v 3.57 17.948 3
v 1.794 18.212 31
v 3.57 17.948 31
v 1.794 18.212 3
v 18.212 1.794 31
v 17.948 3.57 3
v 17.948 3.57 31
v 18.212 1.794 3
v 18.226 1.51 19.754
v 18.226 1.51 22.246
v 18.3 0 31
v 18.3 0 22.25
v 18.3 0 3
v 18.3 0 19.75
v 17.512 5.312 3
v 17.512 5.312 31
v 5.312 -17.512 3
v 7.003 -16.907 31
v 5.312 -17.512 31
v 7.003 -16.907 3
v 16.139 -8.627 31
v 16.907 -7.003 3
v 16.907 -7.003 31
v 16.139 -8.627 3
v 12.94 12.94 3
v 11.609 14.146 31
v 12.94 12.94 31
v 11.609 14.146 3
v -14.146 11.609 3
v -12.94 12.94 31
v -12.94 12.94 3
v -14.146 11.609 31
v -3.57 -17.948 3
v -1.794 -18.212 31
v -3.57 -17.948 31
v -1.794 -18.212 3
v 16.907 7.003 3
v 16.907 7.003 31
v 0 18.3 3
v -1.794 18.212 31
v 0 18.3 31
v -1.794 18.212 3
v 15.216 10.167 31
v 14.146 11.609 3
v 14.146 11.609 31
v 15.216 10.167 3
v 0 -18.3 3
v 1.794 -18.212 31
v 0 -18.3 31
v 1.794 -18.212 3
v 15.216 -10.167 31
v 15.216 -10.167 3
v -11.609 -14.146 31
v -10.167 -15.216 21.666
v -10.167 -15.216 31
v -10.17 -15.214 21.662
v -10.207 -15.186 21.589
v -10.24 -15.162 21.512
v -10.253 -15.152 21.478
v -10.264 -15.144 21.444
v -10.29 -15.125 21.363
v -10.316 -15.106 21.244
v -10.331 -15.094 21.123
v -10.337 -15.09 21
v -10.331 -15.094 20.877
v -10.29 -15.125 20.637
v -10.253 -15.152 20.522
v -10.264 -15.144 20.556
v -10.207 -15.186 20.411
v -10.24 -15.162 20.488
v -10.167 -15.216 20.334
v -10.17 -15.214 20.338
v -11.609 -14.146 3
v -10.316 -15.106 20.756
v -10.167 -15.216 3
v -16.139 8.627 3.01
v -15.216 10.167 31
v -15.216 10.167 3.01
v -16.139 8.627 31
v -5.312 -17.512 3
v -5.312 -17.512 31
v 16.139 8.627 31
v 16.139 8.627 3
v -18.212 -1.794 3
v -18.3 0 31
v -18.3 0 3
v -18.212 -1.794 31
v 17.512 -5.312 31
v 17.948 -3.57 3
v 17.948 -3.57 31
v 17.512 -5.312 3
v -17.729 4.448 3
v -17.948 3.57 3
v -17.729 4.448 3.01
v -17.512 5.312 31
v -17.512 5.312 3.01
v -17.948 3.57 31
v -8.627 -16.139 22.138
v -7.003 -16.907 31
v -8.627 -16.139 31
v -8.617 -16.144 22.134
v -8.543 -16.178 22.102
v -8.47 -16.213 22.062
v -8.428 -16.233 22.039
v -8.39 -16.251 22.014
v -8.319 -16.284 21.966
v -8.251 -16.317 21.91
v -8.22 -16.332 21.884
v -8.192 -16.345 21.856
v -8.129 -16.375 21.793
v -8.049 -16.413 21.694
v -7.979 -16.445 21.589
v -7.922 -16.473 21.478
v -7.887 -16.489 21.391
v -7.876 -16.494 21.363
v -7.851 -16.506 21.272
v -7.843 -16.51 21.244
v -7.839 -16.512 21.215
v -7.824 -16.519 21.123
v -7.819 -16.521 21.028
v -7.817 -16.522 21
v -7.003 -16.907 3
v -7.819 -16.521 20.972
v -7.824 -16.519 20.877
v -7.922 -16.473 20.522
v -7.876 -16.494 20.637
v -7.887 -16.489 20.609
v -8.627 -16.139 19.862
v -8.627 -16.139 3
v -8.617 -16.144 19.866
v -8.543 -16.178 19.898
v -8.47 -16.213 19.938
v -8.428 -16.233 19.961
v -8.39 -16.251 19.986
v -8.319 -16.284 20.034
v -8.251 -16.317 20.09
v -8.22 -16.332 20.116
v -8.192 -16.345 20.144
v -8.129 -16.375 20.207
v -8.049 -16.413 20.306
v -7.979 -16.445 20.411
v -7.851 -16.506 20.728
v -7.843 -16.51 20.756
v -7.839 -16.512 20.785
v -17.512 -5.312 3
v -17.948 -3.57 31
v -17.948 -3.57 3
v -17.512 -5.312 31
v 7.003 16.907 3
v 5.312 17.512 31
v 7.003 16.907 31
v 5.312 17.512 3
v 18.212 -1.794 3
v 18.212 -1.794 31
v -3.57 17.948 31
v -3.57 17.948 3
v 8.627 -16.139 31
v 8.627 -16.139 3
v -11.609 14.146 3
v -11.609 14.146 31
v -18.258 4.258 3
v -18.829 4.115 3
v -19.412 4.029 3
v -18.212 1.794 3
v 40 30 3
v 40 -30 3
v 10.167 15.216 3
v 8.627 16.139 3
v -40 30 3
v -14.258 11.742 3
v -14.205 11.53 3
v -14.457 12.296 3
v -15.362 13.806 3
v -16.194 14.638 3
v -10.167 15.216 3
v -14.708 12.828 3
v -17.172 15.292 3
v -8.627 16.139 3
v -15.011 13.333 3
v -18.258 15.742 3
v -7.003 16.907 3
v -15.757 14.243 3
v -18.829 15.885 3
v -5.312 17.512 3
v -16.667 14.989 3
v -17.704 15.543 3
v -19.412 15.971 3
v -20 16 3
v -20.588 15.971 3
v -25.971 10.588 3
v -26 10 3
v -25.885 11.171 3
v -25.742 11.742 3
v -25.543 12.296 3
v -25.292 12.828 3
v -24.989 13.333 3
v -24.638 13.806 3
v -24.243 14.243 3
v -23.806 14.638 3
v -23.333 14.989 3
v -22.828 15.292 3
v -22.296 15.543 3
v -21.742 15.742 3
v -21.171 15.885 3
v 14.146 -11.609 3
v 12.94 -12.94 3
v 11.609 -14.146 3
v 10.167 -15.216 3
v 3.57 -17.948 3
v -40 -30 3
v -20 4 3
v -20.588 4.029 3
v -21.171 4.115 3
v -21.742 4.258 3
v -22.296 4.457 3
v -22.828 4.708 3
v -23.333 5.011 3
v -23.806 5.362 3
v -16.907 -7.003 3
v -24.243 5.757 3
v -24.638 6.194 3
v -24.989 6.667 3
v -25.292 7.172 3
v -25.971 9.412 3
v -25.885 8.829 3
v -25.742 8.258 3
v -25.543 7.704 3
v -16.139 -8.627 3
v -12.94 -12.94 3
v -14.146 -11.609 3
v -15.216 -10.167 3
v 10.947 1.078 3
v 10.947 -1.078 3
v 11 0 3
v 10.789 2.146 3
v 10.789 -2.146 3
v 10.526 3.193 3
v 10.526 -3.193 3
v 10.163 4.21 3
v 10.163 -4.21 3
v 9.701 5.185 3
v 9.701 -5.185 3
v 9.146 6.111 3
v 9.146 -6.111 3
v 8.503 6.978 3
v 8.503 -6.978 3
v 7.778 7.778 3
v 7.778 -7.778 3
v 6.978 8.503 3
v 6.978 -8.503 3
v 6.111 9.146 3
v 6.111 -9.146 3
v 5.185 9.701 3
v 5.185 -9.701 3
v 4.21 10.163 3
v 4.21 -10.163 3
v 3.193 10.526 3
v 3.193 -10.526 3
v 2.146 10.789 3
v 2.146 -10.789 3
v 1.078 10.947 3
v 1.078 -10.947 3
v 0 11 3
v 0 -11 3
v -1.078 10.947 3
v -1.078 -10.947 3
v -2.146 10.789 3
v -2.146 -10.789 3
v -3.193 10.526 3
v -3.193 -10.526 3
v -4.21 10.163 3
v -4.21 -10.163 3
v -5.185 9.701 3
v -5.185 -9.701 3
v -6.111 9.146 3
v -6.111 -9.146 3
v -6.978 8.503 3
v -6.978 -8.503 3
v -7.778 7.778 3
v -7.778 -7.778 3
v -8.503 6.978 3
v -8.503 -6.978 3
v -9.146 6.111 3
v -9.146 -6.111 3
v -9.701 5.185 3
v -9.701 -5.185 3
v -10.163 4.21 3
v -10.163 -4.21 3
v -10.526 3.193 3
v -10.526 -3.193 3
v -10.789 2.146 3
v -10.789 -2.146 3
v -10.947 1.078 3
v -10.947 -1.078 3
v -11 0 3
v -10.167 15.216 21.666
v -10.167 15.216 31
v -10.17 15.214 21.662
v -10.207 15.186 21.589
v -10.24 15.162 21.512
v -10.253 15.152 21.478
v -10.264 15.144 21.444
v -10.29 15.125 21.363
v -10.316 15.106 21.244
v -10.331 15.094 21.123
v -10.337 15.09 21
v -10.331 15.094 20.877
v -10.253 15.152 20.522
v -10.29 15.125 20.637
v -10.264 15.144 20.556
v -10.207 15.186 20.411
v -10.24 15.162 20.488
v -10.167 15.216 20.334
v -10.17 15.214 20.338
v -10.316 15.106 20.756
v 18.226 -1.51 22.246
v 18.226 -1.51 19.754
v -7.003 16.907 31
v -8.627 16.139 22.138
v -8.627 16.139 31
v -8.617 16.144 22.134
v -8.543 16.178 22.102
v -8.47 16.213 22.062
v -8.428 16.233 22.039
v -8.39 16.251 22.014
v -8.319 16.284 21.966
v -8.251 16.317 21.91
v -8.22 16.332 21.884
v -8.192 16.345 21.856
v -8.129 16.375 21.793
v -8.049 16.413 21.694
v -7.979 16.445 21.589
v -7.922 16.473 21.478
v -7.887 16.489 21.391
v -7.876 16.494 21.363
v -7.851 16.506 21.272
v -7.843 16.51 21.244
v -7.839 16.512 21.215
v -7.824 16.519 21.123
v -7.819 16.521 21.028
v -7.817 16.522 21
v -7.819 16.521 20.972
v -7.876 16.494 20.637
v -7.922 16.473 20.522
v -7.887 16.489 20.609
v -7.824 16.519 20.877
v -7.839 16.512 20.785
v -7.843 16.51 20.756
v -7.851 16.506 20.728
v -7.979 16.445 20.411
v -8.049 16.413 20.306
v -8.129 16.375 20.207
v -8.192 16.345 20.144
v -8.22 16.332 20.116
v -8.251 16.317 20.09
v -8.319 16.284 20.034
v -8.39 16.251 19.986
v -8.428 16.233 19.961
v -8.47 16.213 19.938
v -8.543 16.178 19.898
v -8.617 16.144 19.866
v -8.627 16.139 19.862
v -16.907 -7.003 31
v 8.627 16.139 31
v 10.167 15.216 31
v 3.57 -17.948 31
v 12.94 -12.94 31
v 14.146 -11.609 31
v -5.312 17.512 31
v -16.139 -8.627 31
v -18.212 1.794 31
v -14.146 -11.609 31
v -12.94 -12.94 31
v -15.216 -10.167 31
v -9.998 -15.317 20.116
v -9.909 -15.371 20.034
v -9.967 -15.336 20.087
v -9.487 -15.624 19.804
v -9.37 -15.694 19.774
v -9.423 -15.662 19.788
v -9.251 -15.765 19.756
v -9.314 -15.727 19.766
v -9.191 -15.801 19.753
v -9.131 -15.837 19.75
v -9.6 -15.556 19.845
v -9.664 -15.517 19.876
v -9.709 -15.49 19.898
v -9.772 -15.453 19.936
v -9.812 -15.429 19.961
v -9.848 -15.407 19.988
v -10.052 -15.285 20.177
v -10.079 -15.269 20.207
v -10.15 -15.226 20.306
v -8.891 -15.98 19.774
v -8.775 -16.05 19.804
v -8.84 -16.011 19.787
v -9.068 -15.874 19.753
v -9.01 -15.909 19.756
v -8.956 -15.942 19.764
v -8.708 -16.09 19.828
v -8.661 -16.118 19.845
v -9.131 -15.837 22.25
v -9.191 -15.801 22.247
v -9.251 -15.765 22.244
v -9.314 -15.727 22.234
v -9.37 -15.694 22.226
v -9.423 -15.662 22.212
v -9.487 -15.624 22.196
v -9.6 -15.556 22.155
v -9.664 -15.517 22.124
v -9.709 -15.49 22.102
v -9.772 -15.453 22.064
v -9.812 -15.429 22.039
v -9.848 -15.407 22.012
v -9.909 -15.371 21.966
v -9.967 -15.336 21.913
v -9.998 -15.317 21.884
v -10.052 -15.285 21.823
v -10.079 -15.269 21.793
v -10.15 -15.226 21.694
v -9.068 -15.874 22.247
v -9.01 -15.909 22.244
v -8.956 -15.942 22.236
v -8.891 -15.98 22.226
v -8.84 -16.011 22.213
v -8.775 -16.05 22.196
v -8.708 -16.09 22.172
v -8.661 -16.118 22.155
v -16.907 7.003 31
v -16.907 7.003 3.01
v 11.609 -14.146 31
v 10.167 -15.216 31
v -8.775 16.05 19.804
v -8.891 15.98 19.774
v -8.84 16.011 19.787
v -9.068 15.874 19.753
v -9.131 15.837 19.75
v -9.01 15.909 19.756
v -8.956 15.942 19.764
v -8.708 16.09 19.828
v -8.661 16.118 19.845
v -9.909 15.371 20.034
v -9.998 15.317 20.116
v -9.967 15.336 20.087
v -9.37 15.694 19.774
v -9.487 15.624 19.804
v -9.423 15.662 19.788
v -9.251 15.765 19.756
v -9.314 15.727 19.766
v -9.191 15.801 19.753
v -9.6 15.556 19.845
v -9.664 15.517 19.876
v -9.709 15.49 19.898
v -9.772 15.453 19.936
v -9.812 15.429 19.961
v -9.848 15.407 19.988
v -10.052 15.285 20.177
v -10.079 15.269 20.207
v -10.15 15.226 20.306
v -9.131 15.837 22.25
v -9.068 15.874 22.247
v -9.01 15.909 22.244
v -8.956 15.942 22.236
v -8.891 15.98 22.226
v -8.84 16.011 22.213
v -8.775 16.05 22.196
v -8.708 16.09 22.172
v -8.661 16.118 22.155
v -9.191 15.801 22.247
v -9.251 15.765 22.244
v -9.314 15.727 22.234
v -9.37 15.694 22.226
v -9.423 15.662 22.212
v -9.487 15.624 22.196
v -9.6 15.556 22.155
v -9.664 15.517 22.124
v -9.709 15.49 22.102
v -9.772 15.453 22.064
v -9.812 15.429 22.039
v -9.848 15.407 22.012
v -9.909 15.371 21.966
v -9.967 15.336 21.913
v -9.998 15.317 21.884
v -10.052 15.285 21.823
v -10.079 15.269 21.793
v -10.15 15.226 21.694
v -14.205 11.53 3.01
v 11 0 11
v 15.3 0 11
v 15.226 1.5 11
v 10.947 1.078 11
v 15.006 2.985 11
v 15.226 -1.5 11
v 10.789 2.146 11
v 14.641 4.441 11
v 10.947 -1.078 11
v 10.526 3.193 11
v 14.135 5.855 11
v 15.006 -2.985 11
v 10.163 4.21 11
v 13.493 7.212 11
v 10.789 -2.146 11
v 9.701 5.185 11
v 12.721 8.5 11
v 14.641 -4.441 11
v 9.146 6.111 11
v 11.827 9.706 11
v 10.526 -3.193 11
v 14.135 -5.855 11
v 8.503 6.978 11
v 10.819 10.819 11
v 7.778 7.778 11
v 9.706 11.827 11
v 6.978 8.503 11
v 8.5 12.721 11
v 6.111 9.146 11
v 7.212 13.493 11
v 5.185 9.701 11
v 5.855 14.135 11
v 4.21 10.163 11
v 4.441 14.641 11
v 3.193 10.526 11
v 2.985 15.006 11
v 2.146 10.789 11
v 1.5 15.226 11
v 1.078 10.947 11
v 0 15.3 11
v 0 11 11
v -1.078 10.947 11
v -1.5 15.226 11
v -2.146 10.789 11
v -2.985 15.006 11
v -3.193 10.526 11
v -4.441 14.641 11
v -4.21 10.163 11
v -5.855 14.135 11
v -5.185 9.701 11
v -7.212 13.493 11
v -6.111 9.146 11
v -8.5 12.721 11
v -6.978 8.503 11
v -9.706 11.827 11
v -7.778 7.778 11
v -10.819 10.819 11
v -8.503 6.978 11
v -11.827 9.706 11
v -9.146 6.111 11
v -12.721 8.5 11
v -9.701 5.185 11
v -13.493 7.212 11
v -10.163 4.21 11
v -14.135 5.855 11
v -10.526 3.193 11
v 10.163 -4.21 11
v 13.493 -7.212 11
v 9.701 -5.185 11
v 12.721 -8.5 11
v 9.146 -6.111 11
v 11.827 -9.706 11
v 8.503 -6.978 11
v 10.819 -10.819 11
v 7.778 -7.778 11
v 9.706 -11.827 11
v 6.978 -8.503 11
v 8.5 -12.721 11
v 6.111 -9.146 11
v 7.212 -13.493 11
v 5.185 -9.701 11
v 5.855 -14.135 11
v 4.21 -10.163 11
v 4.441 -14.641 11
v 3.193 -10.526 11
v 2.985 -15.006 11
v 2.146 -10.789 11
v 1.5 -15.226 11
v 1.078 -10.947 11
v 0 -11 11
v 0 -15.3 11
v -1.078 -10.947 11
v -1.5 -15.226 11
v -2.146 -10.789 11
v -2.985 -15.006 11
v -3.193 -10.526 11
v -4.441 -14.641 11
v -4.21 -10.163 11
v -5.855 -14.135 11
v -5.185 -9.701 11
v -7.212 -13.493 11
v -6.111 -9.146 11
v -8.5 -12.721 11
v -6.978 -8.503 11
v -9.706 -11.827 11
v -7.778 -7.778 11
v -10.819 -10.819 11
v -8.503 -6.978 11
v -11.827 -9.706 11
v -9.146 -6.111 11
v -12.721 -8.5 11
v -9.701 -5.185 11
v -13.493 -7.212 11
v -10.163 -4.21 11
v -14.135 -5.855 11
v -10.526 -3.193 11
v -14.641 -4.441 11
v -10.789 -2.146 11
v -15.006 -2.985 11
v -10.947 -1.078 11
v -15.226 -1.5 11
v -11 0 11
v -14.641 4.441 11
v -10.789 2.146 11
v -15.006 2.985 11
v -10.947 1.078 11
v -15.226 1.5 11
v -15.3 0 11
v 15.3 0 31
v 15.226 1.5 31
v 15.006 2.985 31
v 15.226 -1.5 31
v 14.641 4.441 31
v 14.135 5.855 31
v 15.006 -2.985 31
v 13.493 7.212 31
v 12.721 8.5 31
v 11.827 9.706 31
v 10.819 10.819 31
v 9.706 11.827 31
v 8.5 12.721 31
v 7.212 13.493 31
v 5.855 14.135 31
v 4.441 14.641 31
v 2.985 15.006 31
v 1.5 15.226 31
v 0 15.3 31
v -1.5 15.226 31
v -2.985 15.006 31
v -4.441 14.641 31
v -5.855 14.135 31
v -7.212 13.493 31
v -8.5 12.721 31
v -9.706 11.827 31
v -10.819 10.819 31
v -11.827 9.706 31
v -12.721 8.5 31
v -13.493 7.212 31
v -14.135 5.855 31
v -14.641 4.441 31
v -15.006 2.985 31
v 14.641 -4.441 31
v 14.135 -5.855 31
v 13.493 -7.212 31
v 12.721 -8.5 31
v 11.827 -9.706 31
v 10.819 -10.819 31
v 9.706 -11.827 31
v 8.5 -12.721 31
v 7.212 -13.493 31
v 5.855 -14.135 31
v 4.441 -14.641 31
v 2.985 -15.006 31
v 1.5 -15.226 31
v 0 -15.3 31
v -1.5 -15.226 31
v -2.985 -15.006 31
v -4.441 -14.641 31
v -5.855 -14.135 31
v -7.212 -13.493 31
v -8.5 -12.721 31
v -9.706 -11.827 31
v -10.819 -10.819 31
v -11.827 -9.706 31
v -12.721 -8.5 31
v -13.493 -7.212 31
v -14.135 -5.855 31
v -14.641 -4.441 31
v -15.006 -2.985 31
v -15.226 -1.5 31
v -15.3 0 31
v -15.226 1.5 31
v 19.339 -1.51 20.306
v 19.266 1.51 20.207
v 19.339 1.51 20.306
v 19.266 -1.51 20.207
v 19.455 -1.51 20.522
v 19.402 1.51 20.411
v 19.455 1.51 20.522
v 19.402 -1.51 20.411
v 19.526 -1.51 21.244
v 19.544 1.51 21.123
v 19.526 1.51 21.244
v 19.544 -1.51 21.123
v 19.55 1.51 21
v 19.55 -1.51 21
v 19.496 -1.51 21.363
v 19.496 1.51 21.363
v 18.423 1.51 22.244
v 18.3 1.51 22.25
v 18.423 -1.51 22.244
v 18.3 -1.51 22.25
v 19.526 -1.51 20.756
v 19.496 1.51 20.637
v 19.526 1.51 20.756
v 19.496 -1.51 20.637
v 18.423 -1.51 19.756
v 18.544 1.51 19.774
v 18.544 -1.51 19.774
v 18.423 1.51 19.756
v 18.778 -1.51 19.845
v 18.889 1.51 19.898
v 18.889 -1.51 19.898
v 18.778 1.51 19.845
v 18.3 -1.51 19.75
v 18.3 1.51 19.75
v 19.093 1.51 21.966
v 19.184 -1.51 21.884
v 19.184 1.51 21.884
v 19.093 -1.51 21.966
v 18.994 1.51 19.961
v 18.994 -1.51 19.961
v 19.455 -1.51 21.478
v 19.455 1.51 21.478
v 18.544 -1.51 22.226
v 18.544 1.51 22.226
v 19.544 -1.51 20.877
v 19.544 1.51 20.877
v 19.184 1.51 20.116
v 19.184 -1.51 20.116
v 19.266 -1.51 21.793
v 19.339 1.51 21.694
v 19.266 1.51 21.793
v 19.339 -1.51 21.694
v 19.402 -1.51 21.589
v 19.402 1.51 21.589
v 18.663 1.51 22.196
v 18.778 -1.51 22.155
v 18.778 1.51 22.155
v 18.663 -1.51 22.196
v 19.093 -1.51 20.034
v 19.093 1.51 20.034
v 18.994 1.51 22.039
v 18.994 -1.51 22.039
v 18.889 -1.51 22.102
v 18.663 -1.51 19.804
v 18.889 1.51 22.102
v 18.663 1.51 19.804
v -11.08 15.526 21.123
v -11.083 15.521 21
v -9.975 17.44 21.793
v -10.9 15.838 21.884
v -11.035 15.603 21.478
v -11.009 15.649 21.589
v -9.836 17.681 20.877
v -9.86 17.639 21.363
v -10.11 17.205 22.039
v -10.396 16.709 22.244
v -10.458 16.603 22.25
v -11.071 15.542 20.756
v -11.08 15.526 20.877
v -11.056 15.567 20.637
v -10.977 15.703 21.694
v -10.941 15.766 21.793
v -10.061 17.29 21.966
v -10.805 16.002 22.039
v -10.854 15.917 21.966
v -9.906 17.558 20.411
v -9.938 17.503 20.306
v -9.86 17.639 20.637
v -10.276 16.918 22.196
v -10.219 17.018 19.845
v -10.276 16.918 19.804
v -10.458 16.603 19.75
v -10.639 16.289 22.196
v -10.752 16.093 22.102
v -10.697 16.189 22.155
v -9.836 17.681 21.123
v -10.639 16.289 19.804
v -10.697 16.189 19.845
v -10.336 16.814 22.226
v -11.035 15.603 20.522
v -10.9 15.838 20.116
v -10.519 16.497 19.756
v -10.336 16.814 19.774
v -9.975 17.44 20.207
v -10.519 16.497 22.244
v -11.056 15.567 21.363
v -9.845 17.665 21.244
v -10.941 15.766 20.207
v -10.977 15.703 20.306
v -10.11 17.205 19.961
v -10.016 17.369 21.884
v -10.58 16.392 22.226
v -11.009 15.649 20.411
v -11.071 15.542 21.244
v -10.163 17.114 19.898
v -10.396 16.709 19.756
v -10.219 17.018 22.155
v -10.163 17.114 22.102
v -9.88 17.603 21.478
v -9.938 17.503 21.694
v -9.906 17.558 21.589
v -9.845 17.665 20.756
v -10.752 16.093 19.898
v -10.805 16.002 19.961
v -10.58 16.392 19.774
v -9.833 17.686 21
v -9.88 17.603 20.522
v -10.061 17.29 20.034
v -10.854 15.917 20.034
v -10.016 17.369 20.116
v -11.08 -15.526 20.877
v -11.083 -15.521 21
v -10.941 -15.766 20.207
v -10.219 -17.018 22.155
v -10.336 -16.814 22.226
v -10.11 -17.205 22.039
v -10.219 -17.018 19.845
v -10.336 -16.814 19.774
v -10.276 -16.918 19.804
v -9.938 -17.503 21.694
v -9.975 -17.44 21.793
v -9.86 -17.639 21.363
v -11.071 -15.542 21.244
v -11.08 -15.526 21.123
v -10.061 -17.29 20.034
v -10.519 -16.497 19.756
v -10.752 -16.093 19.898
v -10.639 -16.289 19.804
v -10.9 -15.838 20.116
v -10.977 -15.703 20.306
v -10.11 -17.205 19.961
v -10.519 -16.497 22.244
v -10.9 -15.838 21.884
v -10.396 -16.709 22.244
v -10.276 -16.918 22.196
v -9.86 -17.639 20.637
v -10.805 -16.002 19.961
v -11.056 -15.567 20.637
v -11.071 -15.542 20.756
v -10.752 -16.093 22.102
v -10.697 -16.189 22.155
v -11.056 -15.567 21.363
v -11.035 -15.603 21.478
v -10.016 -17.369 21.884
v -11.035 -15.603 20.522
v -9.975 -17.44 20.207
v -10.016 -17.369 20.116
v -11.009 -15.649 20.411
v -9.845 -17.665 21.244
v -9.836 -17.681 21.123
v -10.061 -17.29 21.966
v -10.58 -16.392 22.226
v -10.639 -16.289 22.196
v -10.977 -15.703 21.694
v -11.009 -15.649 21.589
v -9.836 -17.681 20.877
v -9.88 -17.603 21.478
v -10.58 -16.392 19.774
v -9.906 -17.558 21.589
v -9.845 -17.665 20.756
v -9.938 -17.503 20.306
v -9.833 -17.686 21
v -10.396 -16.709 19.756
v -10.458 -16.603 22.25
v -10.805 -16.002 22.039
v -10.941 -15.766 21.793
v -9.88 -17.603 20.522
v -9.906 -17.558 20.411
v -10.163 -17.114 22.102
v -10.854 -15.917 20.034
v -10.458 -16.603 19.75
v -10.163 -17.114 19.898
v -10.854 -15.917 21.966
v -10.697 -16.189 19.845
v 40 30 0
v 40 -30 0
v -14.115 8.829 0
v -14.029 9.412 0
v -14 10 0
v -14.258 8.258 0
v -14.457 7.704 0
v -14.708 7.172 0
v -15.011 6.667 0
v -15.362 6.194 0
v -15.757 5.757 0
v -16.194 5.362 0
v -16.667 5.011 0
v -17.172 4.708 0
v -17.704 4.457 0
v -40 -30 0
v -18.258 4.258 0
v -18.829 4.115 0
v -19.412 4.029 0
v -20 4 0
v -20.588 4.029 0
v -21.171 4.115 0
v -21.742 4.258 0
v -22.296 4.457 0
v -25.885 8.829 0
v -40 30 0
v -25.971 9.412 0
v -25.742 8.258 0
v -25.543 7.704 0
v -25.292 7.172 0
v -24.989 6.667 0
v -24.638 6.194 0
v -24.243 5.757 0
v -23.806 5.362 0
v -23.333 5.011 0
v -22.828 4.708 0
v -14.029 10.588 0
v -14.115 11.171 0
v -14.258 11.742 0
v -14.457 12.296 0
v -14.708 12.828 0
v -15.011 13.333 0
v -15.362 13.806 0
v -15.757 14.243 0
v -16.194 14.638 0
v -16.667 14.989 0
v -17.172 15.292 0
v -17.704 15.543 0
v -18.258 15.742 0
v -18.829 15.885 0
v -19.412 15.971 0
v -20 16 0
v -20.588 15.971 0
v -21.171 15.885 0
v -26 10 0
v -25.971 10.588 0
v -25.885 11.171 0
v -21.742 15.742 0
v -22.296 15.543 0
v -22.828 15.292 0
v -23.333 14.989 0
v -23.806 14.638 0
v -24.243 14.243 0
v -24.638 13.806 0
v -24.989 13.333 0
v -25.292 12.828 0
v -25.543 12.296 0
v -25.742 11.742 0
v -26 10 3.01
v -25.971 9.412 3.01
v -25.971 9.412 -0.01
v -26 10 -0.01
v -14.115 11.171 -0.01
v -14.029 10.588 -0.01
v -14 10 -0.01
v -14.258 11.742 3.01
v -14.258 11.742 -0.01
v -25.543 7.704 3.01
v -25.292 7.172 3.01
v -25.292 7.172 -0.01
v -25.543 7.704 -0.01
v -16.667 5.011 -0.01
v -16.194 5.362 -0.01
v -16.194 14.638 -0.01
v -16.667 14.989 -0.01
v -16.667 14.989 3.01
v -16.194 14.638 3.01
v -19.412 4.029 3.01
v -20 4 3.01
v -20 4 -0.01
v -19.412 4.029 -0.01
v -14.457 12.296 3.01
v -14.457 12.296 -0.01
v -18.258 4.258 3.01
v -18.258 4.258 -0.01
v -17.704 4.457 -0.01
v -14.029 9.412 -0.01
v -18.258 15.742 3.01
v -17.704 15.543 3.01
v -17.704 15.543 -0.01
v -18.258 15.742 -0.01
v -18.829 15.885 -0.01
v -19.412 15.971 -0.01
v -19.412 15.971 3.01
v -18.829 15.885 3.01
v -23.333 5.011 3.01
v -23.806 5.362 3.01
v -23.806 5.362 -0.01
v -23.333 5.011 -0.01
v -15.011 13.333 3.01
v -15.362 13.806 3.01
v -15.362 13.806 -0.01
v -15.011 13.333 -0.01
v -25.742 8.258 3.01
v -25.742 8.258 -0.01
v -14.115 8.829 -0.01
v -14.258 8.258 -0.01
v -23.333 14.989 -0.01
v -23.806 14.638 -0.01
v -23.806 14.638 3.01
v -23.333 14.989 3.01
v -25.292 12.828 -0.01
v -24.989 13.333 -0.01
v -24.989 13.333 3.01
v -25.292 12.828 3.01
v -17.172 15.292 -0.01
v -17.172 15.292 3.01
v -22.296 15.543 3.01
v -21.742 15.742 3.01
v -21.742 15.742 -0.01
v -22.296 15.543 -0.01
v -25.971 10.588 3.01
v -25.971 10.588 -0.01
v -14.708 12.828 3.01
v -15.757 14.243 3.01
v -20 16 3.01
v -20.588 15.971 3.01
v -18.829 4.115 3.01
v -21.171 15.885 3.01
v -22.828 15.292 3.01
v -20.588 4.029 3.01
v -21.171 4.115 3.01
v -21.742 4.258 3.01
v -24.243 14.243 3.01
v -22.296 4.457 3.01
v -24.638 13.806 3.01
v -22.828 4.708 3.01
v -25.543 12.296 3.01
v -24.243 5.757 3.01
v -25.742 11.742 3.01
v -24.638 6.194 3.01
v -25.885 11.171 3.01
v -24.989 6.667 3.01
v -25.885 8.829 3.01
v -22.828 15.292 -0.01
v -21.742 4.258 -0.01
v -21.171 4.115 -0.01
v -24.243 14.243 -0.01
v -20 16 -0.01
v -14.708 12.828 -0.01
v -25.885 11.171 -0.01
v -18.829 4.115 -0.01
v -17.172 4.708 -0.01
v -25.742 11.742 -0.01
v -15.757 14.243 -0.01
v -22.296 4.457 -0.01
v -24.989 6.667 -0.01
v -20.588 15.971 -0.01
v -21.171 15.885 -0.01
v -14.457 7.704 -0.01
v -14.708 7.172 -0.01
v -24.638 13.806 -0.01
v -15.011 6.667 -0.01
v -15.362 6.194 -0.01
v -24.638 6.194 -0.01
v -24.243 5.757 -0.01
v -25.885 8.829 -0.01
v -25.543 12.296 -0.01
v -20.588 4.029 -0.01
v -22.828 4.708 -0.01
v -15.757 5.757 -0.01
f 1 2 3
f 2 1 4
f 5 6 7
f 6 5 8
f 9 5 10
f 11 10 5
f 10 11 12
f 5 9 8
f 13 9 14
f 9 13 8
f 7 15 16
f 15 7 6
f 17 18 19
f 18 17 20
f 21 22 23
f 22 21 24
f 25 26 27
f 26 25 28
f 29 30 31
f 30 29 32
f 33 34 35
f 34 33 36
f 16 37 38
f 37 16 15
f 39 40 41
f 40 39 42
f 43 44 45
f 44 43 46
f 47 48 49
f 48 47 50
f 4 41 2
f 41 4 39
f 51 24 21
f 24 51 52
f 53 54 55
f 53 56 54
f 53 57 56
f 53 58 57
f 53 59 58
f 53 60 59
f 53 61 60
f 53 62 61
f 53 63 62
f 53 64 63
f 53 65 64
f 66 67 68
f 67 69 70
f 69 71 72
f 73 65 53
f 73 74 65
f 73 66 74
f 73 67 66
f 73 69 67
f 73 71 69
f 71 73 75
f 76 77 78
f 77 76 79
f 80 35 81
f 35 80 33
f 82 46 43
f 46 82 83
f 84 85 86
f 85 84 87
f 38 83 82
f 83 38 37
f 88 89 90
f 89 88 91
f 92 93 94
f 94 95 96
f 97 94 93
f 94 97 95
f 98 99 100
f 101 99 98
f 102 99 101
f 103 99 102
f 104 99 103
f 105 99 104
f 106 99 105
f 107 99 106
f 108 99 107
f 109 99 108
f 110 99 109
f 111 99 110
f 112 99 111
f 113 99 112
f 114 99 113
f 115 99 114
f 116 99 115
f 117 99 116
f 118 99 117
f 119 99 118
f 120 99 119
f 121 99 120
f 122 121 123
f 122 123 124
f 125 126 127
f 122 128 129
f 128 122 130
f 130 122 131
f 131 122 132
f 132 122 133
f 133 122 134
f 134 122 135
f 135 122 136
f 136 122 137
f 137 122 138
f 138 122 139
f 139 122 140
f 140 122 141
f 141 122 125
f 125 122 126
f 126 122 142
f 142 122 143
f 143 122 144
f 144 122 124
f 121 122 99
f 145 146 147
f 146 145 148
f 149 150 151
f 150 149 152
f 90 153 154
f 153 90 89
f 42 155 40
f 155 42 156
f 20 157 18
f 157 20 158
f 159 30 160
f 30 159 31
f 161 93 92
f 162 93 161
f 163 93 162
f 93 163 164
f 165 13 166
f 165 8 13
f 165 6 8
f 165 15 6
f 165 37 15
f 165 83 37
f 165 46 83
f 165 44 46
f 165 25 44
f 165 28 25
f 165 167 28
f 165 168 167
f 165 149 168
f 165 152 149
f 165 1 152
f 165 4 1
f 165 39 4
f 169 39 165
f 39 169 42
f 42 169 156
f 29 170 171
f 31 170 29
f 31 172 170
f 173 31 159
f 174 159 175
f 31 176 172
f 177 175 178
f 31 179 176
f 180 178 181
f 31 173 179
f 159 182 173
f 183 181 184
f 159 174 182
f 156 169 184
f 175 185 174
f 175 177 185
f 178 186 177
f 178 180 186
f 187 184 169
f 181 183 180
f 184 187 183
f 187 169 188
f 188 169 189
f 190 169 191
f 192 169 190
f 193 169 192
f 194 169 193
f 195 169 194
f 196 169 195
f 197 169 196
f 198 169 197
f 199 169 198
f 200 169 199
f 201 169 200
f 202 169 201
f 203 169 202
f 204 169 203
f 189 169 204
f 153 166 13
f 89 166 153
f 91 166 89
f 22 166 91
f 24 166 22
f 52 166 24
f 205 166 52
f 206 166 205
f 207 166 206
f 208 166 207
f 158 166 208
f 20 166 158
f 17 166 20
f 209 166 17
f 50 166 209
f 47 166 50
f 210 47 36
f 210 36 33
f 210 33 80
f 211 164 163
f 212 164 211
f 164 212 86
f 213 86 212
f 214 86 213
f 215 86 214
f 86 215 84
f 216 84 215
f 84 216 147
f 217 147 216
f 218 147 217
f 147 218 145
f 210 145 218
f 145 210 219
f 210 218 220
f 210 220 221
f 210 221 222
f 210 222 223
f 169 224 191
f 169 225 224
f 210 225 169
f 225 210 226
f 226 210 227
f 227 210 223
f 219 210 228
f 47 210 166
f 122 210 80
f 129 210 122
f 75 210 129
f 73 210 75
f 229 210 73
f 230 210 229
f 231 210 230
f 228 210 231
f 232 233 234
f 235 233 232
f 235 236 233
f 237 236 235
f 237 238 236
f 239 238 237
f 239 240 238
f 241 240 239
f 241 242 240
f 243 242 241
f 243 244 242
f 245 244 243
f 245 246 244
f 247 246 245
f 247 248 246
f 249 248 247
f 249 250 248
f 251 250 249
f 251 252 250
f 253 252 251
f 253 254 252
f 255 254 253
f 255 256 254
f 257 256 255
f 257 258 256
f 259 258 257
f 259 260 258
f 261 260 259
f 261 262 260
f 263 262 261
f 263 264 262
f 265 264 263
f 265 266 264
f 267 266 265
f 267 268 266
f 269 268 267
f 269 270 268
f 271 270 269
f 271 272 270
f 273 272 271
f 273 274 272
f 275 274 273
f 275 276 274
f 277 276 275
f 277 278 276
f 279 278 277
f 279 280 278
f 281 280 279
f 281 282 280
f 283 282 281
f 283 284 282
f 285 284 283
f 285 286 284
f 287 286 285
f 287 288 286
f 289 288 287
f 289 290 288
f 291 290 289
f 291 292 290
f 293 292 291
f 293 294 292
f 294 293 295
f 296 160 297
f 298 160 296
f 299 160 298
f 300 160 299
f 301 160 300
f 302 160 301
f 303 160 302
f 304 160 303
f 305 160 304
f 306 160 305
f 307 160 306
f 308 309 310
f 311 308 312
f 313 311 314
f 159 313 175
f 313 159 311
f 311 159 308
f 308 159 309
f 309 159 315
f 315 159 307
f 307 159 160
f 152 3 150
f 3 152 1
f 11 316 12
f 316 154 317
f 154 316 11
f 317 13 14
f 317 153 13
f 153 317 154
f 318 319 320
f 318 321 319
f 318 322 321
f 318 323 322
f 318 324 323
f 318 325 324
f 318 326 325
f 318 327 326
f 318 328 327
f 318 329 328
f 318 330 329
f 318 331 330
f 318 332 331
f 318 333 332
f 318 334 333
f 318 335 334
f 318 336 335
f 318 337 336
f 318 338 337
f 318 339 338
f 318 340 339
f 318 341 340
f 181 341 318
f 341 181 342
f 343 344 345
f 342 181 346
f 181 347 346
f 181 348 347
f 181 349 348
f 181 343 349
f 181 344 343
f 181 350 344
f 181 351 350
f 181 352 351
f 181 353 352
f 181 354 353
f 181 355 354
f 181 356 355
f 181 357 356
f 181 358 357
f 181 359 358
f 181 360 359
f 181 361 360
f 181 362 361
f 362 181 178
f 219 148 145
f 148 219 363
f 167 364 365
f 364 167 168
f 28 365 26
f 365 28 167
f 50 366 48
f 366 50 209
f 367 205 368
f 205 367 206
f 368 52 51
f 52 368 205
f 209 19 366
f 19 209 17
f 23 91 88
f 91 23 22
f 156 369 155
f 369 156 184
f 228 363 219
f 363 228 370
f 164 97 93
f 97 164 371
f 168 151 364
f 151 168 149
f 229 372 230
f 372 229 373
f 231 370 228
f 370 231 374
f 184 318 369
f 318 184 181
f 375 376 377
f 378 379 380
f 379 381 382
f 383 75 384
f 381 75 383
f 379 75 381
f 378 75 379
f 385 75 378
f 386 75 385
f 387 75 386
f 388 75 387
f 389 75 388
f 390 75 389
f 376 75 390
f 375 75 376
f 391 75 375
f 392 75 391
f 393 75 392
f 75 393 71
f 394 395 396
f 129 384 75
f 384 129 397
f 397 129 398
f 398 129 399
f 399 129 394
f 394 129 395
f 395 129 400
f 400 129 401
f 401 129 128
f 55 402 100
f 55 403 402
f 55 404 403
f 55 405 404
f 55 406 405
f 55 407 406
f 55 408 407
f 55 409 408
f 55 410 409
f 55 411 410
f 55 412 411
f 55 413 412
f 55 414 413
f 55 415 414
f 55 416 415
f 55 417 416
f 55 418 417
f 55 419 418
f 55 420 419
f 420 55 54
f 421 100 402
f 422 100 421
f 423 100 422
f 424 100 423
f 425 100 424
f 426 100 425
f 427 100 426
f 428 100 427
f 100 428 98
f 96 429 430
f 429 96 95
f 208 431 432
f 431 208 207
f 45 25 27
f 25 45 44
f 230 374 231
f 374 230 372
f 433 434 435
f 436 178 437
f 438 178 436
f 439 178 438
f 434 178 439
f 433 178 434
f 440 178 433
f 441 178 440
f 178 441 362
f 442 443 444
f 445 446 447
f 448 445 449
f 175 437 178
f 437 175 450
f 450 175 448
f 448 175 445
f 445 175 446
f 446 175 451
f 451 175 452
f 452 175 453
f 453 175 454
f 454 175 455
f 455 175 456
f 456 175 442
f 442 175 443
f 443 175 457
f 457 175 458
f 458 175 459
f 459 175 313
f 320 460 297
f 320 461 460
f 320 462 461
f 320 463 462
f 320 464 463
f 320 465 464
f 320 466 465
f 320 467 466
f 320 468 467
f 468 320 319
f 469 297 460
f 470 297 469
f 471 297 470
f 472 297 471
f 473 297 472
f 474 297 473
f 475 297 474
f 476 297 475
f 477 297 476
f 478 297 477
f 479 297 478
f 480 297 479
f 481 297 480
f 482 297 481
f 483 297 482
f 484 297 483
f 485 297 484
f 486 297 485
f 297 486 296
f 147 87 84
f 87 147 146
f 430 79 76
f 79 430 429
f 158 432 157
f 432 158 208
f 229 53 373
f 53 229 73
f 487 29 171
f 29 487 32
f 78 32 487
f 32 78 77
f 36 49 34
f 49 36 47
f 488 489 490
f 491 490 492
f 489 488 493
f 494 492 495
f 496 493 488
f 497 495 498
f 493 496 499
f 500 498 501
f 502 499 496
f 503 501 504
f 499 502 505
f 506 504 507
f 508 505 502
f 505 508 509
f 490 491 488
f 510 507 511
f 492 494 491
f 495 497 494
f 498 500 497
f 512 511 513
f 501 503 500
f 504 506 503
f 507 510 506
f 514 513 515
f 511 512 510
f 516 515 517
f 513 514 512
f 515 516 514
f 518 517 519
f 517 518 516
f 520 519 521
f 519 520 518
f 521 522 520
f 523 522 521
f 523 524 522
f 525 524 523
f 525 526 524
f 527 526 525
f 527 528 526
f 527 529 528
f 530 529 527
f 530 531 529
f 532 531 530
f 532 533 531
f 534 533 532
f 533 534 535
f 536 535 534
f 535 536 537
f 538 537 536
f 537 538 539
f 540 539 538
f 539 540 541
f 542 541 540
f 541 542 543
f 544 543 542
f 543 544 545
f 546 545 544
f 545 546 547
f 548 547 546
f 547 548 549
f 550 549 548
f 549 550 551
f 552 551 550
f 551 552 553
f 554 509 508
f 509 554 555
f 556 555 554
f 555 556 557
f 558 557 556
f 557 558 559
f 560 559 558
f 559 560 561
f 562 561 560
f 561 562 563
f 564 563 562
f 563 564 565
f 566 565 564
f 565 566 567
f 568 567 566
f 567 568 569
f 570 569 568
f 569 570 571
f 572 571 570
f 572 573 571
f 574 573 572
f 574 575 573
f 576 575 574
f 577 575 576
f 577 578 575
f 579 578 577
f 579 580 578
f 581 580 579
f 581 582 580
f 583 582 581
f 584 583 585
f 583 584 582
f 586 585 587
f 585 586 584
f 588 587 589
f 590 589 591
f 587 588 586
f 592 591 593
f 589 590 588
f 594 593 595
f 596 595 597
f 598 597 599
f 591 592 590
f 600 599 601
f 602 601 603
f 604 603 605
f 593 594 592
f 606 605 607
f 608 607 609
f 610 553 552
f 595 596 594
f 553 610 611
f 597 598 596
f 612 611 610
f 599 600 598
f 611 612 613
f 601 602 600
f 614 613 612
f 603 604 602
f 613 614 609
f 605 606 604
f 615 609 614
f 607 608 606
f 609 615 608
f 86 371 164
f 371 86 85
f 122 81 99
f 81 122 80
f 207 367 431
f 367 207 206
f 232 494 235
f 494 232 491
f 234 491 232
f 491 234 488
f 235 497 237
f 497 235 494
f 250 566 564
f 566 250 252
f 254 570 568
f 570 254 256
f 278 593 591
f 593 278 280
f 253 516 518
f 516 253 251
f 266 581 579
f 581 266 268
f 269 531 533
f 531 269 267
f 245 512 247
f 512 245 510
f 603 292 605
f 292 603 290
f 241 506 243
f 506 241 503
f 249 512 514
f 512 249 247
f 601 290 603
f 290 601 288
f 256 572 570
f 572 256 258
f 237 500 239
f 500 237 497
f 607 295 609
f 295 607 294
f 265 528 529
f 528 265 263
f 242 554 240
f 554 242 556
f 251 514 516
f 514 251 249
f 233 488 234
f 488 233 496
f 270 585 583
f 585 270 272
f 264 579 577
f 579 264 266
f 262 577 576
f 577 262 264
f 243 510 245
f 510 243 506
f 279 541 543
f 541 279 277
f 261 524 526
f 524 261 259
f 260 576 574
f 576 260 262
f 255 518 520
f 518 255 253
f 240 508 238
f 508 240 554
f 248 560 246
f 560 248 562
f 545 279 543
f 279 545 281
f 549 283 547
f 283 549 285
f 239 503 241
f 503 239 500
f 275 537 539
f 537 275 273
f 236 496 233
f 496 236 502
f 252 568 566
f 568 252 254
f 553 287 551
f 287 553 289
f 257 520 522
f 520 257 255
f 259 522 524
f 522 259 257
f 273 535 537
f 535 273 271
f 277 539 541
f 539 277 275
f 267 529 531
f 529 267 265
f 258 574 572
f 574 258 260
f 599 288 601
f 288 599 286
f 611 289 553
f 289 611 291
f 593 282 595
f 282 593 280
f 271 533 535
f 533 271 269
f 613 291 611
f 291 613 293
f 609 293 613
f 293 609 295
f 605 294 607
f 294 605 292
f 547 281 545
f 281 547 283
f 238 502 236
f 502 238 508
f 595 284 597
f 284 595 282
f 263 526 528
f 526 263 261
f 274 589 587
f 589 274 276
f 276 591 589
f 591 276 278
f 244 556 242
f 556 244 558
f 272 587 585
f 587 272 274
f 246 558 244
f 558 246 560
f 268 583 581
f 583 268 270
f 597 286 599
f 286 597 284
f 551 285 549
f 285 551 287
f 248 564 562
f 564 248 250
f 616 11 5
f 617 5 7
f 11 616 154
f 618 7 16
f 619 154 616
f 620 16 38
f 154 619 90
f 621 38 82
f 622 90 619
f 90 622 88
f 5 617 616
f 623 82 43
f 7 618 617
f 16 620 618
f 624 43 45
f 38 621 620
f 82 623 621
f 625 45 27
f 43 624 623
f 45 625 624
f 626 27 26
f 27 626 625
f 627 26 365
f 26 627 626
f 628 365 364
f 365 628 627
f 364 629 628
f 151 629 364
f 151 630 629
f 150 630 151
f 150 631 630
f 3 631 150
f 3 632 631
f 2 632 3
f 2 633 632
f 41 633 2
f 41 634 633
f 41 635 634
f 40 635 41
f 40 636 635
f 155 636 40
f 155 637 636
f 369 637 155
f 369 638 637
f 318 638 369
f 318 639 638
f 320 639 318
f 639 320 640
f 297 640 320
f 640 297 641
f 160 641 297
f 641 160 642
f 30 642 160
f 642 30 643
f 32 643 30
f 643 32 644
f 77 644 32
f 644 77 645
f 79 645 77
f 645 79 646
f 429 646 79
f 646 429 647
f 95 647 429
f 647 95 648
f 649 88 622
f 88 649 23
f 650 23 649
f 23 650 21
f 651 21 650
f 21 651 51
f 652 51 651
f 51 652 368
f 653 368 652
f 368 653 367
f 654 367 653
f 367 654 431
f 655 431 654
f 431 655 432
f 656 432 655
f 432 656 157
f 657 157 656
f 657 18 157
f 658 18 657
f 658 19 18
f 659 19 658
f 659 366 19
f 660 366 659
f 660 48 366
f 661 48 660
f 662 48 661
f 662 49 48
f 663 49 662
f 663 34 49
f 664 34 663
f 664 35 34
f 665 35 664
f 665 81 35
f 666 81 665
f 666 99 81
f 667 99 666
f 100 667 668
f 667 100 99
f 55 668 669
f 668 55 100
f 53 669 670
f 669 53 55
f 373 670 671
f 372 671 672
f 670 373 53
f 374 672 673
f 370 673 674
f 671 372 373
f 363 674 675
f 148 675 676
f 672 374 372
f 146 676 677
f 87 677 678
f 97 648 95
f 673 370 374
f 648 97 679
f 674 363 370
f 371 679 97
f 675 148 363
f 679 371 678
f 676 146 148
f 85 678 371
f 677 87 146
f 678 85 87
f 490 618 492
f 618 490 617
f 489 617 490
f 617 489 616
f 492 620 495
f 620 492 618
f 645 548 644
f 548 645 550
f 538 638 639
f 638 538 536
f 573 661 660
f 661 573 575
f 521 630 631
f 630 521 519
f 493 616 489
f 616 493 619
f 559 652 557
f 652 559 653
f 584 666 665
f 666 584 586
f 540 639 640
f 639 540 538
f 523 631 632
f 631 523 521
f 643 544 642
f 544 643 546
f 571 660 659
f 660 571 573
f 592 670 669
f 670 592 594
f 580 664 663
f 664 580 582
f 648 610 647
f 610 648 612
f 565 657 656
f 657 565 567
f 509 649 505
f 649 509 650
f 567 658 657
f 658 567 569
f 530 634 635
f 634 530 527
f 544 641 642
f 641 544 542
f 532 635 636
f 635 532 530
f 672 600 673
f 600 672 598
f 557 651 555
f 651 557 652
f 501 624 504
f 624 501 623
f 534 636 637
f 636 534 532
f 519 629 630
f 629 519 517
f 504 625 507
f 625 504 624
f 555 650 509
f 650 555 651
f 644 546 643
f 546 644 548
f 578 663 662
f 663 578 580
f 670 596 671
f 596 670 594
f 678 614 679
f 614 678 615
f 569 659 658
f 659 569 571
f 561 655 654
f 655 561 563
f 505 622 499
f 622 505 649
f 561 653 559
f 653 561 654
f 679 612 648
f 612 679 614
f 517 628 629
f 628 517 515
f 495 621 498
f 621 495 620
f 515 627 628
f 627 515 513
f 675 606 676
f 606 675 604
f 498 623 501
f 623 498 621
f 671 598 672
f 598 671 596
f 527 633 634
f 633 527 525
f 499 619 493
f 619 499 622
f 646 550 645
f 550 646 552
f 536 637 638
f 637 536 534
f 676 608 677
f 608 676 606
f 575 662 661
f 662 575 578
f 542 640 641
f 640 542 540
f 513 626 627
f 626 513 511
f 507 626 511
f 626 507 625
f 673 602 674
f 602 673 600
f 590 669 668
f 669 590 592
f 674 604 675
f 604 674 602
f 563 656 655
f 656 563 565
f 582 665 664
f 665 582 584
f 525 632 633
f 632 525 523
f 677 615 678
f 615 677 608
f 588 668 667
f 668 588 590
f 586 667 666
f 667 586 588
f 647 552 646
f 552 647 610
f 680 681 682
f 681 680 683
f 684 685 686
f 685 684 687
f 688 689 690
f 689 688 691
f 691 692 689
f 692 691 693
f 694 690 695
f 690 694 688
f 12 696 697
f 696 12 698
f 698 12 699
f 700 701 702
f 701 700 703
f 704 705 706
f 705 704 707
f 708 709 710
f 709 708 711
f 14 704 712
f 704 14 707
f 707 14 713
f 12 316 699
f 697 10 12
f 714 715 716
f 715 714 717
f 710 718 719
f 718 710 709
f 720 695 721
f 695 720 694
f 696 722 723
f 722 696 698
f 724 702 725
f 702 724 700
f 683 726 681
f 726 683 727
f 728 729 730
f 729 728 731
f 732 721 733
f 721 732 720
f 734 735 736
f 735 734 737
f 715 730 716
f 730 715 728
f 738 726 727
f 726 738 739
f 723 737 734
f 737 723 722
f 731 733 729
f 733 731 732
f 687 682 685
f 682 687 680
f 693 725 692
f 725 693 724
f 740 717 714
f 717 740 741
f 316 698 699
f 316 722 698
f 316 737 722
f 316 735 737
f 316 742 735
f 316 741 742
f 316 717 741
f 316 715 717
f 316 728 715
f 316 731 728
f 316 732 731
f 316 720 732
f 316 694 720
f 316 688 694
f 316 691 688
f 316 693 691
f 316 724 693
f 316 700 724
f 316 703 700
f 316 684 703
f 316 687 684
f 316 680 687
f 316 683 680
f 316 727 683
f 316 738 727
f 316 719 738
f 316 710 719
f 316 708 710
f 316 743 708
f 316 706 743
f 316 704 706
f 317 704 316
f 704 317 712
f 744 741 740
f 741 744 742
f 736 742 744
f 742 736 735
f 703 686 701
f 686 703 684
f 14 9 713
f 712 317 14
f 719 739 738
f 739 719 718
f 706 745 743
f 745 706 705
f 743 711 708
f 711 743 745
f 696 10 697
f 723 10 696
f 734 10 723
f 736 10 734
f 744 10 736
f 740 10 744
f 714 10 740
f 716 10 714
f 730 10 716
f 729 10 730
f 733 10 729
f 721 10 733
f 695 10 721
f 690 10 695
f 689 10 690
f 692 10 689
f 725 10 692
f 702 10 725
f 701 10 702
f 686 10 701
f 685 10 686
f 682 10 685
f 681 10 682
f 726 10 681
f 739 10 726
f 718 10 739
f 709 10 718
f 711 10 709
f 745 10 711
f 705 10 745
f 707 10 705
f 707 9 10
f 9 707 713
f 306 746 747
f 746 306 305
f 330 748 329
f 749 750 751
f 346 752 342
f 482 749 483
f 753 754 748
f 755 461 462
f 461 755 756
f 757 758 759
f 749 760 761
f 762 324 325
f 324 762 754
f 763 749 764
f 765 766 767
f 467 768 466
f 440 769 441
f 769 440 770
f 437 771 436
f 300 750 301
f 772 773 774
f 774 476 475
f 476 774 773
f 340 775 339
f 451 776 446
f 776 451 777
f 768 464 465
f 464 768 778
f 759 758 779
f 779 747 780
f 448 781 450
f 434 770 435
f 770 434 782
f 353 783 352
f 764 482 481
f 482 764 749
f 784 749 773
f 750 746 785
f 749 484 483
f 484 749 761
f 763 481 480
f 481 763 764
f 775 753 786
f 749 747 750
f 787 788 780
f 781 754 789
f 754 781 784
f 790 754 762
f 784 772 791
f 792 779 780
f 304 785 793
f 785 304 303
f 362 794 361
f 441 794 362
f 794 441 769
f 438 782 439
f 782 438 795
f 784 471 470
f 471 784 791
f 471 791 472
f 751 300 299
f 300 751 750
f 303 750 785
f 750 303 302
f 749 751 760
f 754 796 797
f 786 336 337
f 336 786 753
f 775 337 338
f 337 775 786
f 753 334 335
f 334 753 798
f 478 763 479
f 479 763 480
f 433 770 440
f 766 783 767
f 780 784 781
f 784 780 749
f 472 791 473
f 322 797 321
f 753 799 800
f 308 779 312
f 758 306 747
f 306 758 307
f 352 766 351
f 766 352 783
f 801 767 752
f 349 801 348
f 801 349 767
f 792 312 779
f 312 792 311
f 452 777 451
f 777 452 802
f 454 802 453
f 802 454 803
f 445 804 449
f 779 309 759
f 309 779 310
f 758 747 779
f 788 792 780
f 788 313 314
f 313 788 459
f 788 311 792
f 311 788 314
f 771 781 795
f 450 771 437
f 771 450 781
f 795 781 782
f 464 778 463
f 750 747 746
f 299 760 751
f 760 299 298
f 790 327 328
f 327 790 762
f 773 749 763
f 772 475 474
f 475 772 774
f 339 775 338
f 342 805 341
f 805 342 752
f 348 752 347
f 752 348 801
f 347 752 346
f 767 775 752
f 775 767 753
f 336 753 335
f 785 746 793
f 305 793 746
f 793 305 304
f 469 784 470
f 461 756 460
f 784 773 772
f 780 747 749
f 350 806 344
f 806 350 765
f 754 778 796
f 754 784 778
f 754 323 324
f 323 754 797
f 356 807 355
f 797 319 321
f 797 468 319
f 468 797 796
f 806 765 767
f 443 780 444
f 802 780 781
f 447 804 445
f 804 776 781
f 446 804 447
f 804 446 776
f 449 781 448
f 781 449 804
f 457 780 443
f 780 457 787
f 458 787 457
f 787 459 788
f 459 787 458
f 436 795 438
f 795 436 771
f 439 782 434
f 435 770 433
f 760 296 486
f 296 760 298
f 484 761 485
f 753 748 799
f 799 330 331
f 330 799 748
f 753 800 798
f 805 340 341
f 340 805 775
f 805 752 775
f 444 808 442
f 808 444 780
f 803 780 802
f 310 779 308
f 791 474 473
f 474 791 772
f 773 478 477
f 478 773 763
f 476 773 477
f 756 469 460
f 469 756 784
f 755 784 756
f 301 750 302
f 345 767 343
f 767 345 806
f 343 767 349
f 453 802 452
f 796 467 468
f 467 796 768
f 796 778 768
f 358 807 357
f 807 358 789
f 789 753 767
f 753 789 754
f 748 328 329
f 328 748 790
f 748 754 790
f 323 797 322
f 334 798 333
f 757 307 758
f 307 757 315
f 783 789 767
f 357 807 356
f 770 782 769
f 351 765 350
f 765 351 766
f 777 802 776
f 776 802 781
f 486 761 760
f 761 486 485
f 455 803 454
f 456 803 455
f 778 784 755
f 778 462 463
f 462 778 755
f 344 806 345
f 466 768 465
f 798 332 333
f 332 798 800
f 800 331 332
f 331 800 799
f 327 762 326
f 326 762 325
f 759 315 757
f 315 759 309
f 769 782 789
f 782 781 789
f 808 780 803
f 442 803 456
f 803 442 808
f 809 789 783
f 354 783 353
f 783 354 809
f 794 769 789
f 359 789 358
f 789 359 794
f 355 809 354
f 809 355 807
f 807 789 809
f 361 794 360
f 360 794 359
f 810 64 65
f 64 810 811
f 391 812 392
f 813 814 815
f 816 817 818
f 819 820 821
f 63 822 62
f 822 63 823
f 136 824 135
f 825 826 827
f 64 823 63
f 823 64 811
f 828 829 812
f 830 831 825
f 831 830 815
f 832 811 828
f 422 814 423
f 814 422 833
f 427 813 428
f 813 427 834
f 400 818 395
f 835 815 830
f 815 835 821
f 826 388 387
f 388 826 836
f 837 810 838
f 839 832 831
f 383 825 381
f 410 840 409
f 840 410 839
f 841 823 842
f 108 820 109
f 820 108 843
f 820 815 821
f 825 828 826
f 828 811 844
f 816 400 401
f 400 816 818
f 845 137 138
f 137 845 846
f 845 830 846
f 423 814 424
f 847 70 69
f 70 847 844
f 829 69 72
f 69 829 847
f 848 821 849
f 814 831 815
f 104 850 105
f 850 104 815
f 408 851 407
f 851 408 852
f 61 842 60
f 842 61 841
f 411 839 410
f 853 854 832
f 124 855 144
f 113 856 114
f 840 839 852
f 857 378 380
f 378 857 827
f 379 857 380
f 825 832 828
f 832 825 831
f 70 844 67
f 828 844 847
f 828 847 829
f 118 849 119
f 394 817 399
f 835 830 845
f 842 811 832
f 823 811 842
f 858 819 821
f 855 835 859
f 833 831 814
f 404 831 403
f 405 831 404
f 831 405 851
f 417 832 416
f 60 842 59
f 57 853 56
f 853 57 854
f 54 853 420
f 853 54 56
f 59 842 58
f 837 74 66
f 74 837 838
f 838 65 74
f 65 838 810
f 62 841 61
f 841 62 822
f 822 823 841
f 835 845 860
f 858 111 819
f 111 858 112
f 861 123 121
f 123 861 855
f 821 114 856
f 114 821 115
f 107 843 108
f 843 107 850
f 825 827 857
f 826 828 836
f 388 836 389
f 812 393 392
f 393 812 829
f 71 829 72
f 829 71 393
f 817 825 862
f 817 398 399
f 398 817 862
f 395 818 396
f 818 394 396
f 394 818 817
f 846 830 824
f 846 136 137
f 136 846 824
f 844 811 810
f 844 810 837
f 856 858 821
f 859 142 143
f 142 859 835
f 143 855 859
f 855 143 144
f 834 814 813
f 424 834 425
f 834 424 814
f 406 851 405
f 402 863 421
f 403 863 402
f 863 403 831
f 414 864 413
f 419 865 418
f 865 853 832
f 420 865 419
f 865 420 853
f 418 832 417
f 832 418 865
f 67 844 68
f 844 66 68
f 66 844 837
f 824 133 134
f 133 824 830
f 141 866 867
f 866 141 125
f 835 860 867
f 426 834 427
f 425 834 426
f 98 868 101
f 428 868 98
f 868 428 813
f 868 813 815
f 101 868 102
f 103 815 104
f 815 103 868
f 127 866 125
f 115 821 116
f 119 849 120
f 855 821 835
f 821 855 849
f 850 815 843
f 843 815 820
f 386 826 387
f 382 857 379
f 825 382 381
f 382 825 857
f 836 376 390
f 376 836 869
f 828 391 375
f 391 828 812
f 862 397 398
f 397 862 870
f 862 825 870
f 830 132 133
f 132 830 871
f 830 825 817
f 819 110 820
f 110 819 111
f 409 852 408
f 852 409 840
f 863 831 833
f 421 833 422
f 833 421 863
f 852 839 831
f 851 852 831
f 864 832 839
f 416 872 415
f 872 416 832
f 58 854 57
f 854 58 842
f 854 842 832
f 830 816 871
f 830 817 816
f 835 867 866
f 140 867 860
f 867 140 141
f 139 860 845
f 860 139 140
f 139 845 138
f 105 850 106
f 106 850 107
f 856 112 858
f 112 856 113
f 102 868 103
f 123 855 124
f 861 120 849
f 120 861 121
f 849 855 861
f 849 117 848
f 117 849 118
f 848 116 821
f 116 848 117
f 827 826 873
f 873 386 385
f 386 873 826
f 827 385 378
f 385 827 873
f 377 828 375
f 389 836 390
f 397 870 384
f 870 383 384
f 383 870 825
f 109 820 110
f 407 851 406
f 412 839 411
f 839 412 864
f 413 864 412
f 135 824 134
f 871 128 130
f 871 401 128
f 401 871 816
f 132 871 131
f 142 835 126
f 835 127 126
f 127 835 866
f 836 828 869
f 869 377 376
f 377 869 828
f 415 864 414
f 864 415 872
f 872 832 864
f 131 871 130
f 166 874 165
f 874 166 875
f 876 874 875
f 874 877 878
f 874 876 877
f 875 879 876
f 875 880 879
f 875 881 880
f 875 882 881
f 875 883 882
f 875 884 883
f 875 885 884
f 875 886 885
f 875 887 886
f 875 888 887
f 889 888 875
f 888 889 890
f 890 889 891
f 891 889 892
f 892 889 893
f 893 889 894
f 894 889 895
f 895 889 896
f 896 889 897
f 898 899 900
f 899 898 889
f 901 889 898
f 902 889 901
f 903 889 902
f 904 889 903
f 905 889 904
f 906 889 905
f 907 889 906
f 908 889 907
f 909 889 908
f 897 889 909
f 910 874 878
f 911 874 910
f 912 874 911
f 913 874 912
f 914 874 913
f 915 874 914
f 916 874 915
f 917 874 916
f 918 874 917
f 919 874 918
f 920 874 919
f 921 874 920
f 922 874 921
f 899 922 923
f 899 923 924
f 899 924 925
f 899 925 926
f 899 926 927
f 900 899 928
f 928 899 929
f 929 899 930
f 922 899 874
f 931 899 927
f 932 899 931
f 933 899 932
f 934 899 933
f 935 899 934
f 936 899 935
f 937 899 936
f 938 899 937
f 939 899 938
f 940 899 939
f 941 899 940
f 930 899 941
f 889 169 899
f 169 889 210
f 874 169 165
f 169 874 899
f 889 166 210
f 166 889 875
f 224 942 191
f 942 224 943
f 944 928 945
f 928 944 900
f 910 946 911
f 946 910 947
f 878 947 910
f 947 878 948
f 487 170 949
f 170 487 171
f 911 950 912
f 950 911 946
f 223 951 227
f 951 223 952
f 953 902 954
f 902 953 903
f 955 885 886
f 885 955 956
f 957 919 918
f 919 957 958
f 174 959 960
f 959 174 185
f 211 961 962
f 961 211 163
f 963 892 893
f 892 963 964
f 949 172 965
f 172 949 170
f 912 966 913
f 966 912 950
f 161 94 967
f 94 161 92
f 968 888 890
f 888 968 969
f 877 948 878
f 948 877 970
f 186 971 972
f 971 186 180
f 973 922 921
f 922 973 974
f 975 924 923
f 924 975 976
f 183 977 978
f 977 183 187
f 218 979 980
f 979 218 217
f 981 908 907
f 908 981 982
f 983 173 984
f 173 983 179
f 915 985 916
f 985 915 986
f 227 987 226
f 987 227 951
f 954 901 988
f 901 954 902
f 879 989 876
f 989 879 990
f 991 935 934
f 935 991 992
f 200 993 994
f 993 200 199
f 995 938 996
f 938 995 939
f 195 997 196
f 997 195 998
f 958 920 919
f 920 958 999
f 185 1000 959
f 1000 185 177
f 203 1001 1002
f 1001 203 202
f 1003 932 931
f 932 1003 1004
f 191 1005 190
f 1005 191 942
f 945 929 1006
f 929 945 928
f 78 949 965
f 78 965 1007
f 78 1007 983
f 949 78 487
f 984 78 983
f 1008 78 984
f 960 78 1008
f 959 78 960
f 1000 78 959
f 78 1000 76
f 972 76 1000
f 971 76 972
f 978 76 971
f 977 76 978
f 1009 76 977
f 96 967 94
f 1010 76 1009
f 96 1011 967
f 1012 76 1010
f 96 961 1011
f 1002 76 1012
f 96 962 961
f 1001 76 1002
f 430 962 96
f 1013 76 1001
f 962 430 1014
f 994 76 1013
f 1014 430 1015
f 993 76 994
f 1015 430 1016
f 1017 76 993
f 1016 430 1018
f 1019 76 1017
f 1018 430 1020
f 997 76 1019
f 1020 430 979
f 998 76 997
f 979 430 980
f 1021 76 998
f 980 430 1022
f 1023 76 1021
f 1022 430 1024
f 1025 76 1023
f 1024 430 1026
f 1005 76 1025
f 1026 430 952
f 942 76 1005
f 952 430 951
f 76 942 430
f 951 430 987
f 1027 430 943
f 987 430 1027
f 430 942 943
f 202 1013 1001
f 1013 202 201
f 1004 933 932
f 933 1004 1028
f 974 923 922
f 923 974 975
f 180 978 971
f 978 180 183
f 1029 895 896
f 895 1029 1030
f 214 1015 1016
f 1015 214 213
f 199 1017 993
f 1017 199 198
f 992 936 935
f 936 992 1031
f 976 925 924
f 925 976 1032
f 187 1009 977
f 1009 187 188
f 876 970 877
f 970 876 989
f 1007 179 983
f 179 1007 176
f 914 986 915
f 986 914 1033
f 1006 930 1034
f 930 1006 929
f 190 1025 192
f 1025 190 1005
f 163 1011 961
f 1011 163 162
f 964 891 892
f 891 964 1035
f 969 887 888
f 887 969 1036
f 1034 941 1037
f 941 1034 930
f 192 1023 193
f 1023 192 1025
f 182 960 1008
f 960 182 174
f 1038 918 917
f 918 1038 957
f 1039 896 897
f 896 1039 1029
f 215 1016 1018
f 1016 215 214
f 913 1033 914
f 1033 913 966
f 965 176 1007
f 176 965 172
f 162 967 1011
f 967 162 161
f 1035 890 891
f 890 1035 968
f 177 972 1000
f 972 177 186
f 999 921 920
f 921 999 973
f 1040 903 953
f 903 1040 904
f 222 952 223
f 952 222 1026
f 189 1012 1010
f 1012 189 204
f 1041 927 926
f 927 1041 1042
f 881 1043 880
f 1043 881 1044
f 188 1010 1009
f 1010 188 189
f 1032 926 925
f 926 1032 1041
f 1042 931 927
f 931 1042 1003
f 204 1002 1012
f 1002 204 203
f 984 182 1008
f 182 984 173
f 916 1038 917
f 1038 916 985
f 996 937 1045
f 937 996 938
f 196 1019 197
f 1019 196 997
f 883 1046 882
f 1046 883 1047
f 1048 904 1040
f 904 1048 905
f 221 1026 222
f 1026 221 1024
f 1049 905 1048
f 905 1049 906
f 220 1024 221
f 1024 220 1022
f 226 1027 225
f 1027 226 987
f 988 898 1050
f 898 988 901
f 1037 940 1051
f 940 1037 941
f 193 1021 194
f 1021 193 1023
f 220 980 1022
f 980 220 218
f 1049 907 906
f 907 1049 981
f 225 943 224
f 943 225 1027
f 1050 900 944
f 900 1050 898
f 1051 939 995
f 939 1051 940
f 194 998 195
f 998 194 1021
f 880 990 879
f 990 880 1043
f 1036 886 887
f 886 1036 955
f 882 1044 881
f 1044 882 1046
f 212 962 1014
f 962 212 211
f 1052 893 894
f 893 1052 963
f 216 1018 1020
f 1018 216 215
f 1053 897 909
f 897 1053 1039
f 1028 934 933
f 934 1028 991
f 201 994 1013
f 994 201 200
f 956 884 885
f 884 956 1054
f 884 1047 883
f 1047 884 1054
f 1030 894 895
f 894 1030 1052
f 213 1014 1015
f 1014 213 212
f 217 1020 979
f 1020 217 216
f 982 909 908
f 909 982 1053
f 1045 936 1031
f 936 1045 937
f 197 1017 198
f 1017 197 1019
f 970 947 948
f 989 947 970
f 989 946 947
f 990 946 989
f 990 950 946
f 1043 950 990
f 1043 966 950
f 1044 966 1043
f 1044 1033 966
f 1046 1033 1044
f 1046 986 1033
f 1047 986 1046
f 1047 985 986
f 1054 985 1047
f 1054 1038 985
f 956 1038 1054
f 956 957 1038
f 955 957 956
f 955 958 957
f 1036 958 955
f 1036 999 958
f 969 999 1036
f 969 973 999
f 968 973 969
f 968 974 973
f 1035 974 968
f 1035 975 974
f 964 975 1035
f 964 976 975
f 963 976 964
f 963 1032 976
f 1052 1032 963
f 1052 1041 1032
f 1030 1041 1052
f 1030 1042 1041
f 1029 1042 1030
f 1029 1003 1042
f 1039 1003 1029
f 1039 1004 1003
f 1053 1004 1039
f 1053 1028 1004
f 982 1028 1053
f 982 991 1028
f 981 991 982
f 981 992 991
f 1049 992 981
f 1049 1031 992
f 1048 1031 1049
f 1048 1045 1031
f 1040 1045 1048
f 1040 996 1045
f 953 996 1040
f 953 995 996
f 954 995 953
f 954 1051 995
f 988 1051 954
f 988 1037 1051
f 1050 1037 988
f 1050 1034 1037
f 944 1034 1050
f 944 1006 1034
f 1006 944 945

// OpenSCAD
// Adapter for phone camera over microscope eyepiece
// Dimensions measured with calipers

// Plate dimensions
plate_x = 80;
plate_y = 60;
plate_z = 3;

// Camera hole
camera_hole_dia = 12;
camera_hole_x = -20;
camera_hole_y = 10;

// Sleeve dimensions
sleeve_od = 36.6;
sleeve_id_lower = 22;
sleeve_id_upper = 30.6;
sleeve_z_start = 3;
sleeve_z_stop = 11;
sleeve_z_top = 31;

// Centering screws
screw_hole_dia = 2.5;
screw_z = 21;
screw_count = 3;
screw_angle_start = 0; // +X direction

$fn = 64;

// Base plate - positioned at z=0 to z=3, centered on origin
translate([-plate_x/2, -plate_y/2, 0])
  cube([plate_x, plate_y, plate_z]);

// Camera hole through plate - extends slightly past plate thickness
translate([camera_hole_x, camera_hole_y, -0.01])
  cylinder(h = plate_z + 0.02, r = camera_hole_dia / 2, center = false);

// Sleeve - lower section (z=3 to z=11) with 22mm bore
translate([0, 0, sleeve_z_start])
  difference() {
    cylinder(h = sleeve_z_stop - sleeve_z_start, r = sleeve_od / 2, center = false);
    cylinder(h = (sleeve_z_stop - sleeve_z_start) + 0.02, r = sleeve_id_lower / 2, center = false);
  }

// Sleeve - upper section (z=11 to z=31) with 30.6mm bore
translate([0, 0, sleeve_z_stop])
  difference() {
    cylinder(h = sleeve_z_top - sleeve_z_stop, r = sleeve_od / 2, center = false);
    cylinder(h = (sleeve_z_top - sleeve_z_stop) + 0.02, r = sleeve_id_upper / 2, center = false);
  }

// Three radial M3 centering screw holes at z=21
for (i = [0:screw_count-1]) {
  angle = screw_angle_start + i * (360 / screw_count);
  // Position on the sleeve wall at radius = sleeve_od/2
  x = (sleeve_od / 2) * cos(angle);
  y = (sleeve_od / 2) * sin(angle);
  
  // Hole goes radially through the sleeve wall
  // Wall thickness = (sleeve_od - sleeve_id_upper)/2 for upper section
  wall_thickness = (sleeve_od - sleeve_id_upper) / 2;
  
  translate([x, y, screw_z])
    rotate([90, 0, -angle]) // Orient hole radially
    cylinder(h = wall_thickness + 0.02, r = screw_hole_dia / 2, center = true);
}
